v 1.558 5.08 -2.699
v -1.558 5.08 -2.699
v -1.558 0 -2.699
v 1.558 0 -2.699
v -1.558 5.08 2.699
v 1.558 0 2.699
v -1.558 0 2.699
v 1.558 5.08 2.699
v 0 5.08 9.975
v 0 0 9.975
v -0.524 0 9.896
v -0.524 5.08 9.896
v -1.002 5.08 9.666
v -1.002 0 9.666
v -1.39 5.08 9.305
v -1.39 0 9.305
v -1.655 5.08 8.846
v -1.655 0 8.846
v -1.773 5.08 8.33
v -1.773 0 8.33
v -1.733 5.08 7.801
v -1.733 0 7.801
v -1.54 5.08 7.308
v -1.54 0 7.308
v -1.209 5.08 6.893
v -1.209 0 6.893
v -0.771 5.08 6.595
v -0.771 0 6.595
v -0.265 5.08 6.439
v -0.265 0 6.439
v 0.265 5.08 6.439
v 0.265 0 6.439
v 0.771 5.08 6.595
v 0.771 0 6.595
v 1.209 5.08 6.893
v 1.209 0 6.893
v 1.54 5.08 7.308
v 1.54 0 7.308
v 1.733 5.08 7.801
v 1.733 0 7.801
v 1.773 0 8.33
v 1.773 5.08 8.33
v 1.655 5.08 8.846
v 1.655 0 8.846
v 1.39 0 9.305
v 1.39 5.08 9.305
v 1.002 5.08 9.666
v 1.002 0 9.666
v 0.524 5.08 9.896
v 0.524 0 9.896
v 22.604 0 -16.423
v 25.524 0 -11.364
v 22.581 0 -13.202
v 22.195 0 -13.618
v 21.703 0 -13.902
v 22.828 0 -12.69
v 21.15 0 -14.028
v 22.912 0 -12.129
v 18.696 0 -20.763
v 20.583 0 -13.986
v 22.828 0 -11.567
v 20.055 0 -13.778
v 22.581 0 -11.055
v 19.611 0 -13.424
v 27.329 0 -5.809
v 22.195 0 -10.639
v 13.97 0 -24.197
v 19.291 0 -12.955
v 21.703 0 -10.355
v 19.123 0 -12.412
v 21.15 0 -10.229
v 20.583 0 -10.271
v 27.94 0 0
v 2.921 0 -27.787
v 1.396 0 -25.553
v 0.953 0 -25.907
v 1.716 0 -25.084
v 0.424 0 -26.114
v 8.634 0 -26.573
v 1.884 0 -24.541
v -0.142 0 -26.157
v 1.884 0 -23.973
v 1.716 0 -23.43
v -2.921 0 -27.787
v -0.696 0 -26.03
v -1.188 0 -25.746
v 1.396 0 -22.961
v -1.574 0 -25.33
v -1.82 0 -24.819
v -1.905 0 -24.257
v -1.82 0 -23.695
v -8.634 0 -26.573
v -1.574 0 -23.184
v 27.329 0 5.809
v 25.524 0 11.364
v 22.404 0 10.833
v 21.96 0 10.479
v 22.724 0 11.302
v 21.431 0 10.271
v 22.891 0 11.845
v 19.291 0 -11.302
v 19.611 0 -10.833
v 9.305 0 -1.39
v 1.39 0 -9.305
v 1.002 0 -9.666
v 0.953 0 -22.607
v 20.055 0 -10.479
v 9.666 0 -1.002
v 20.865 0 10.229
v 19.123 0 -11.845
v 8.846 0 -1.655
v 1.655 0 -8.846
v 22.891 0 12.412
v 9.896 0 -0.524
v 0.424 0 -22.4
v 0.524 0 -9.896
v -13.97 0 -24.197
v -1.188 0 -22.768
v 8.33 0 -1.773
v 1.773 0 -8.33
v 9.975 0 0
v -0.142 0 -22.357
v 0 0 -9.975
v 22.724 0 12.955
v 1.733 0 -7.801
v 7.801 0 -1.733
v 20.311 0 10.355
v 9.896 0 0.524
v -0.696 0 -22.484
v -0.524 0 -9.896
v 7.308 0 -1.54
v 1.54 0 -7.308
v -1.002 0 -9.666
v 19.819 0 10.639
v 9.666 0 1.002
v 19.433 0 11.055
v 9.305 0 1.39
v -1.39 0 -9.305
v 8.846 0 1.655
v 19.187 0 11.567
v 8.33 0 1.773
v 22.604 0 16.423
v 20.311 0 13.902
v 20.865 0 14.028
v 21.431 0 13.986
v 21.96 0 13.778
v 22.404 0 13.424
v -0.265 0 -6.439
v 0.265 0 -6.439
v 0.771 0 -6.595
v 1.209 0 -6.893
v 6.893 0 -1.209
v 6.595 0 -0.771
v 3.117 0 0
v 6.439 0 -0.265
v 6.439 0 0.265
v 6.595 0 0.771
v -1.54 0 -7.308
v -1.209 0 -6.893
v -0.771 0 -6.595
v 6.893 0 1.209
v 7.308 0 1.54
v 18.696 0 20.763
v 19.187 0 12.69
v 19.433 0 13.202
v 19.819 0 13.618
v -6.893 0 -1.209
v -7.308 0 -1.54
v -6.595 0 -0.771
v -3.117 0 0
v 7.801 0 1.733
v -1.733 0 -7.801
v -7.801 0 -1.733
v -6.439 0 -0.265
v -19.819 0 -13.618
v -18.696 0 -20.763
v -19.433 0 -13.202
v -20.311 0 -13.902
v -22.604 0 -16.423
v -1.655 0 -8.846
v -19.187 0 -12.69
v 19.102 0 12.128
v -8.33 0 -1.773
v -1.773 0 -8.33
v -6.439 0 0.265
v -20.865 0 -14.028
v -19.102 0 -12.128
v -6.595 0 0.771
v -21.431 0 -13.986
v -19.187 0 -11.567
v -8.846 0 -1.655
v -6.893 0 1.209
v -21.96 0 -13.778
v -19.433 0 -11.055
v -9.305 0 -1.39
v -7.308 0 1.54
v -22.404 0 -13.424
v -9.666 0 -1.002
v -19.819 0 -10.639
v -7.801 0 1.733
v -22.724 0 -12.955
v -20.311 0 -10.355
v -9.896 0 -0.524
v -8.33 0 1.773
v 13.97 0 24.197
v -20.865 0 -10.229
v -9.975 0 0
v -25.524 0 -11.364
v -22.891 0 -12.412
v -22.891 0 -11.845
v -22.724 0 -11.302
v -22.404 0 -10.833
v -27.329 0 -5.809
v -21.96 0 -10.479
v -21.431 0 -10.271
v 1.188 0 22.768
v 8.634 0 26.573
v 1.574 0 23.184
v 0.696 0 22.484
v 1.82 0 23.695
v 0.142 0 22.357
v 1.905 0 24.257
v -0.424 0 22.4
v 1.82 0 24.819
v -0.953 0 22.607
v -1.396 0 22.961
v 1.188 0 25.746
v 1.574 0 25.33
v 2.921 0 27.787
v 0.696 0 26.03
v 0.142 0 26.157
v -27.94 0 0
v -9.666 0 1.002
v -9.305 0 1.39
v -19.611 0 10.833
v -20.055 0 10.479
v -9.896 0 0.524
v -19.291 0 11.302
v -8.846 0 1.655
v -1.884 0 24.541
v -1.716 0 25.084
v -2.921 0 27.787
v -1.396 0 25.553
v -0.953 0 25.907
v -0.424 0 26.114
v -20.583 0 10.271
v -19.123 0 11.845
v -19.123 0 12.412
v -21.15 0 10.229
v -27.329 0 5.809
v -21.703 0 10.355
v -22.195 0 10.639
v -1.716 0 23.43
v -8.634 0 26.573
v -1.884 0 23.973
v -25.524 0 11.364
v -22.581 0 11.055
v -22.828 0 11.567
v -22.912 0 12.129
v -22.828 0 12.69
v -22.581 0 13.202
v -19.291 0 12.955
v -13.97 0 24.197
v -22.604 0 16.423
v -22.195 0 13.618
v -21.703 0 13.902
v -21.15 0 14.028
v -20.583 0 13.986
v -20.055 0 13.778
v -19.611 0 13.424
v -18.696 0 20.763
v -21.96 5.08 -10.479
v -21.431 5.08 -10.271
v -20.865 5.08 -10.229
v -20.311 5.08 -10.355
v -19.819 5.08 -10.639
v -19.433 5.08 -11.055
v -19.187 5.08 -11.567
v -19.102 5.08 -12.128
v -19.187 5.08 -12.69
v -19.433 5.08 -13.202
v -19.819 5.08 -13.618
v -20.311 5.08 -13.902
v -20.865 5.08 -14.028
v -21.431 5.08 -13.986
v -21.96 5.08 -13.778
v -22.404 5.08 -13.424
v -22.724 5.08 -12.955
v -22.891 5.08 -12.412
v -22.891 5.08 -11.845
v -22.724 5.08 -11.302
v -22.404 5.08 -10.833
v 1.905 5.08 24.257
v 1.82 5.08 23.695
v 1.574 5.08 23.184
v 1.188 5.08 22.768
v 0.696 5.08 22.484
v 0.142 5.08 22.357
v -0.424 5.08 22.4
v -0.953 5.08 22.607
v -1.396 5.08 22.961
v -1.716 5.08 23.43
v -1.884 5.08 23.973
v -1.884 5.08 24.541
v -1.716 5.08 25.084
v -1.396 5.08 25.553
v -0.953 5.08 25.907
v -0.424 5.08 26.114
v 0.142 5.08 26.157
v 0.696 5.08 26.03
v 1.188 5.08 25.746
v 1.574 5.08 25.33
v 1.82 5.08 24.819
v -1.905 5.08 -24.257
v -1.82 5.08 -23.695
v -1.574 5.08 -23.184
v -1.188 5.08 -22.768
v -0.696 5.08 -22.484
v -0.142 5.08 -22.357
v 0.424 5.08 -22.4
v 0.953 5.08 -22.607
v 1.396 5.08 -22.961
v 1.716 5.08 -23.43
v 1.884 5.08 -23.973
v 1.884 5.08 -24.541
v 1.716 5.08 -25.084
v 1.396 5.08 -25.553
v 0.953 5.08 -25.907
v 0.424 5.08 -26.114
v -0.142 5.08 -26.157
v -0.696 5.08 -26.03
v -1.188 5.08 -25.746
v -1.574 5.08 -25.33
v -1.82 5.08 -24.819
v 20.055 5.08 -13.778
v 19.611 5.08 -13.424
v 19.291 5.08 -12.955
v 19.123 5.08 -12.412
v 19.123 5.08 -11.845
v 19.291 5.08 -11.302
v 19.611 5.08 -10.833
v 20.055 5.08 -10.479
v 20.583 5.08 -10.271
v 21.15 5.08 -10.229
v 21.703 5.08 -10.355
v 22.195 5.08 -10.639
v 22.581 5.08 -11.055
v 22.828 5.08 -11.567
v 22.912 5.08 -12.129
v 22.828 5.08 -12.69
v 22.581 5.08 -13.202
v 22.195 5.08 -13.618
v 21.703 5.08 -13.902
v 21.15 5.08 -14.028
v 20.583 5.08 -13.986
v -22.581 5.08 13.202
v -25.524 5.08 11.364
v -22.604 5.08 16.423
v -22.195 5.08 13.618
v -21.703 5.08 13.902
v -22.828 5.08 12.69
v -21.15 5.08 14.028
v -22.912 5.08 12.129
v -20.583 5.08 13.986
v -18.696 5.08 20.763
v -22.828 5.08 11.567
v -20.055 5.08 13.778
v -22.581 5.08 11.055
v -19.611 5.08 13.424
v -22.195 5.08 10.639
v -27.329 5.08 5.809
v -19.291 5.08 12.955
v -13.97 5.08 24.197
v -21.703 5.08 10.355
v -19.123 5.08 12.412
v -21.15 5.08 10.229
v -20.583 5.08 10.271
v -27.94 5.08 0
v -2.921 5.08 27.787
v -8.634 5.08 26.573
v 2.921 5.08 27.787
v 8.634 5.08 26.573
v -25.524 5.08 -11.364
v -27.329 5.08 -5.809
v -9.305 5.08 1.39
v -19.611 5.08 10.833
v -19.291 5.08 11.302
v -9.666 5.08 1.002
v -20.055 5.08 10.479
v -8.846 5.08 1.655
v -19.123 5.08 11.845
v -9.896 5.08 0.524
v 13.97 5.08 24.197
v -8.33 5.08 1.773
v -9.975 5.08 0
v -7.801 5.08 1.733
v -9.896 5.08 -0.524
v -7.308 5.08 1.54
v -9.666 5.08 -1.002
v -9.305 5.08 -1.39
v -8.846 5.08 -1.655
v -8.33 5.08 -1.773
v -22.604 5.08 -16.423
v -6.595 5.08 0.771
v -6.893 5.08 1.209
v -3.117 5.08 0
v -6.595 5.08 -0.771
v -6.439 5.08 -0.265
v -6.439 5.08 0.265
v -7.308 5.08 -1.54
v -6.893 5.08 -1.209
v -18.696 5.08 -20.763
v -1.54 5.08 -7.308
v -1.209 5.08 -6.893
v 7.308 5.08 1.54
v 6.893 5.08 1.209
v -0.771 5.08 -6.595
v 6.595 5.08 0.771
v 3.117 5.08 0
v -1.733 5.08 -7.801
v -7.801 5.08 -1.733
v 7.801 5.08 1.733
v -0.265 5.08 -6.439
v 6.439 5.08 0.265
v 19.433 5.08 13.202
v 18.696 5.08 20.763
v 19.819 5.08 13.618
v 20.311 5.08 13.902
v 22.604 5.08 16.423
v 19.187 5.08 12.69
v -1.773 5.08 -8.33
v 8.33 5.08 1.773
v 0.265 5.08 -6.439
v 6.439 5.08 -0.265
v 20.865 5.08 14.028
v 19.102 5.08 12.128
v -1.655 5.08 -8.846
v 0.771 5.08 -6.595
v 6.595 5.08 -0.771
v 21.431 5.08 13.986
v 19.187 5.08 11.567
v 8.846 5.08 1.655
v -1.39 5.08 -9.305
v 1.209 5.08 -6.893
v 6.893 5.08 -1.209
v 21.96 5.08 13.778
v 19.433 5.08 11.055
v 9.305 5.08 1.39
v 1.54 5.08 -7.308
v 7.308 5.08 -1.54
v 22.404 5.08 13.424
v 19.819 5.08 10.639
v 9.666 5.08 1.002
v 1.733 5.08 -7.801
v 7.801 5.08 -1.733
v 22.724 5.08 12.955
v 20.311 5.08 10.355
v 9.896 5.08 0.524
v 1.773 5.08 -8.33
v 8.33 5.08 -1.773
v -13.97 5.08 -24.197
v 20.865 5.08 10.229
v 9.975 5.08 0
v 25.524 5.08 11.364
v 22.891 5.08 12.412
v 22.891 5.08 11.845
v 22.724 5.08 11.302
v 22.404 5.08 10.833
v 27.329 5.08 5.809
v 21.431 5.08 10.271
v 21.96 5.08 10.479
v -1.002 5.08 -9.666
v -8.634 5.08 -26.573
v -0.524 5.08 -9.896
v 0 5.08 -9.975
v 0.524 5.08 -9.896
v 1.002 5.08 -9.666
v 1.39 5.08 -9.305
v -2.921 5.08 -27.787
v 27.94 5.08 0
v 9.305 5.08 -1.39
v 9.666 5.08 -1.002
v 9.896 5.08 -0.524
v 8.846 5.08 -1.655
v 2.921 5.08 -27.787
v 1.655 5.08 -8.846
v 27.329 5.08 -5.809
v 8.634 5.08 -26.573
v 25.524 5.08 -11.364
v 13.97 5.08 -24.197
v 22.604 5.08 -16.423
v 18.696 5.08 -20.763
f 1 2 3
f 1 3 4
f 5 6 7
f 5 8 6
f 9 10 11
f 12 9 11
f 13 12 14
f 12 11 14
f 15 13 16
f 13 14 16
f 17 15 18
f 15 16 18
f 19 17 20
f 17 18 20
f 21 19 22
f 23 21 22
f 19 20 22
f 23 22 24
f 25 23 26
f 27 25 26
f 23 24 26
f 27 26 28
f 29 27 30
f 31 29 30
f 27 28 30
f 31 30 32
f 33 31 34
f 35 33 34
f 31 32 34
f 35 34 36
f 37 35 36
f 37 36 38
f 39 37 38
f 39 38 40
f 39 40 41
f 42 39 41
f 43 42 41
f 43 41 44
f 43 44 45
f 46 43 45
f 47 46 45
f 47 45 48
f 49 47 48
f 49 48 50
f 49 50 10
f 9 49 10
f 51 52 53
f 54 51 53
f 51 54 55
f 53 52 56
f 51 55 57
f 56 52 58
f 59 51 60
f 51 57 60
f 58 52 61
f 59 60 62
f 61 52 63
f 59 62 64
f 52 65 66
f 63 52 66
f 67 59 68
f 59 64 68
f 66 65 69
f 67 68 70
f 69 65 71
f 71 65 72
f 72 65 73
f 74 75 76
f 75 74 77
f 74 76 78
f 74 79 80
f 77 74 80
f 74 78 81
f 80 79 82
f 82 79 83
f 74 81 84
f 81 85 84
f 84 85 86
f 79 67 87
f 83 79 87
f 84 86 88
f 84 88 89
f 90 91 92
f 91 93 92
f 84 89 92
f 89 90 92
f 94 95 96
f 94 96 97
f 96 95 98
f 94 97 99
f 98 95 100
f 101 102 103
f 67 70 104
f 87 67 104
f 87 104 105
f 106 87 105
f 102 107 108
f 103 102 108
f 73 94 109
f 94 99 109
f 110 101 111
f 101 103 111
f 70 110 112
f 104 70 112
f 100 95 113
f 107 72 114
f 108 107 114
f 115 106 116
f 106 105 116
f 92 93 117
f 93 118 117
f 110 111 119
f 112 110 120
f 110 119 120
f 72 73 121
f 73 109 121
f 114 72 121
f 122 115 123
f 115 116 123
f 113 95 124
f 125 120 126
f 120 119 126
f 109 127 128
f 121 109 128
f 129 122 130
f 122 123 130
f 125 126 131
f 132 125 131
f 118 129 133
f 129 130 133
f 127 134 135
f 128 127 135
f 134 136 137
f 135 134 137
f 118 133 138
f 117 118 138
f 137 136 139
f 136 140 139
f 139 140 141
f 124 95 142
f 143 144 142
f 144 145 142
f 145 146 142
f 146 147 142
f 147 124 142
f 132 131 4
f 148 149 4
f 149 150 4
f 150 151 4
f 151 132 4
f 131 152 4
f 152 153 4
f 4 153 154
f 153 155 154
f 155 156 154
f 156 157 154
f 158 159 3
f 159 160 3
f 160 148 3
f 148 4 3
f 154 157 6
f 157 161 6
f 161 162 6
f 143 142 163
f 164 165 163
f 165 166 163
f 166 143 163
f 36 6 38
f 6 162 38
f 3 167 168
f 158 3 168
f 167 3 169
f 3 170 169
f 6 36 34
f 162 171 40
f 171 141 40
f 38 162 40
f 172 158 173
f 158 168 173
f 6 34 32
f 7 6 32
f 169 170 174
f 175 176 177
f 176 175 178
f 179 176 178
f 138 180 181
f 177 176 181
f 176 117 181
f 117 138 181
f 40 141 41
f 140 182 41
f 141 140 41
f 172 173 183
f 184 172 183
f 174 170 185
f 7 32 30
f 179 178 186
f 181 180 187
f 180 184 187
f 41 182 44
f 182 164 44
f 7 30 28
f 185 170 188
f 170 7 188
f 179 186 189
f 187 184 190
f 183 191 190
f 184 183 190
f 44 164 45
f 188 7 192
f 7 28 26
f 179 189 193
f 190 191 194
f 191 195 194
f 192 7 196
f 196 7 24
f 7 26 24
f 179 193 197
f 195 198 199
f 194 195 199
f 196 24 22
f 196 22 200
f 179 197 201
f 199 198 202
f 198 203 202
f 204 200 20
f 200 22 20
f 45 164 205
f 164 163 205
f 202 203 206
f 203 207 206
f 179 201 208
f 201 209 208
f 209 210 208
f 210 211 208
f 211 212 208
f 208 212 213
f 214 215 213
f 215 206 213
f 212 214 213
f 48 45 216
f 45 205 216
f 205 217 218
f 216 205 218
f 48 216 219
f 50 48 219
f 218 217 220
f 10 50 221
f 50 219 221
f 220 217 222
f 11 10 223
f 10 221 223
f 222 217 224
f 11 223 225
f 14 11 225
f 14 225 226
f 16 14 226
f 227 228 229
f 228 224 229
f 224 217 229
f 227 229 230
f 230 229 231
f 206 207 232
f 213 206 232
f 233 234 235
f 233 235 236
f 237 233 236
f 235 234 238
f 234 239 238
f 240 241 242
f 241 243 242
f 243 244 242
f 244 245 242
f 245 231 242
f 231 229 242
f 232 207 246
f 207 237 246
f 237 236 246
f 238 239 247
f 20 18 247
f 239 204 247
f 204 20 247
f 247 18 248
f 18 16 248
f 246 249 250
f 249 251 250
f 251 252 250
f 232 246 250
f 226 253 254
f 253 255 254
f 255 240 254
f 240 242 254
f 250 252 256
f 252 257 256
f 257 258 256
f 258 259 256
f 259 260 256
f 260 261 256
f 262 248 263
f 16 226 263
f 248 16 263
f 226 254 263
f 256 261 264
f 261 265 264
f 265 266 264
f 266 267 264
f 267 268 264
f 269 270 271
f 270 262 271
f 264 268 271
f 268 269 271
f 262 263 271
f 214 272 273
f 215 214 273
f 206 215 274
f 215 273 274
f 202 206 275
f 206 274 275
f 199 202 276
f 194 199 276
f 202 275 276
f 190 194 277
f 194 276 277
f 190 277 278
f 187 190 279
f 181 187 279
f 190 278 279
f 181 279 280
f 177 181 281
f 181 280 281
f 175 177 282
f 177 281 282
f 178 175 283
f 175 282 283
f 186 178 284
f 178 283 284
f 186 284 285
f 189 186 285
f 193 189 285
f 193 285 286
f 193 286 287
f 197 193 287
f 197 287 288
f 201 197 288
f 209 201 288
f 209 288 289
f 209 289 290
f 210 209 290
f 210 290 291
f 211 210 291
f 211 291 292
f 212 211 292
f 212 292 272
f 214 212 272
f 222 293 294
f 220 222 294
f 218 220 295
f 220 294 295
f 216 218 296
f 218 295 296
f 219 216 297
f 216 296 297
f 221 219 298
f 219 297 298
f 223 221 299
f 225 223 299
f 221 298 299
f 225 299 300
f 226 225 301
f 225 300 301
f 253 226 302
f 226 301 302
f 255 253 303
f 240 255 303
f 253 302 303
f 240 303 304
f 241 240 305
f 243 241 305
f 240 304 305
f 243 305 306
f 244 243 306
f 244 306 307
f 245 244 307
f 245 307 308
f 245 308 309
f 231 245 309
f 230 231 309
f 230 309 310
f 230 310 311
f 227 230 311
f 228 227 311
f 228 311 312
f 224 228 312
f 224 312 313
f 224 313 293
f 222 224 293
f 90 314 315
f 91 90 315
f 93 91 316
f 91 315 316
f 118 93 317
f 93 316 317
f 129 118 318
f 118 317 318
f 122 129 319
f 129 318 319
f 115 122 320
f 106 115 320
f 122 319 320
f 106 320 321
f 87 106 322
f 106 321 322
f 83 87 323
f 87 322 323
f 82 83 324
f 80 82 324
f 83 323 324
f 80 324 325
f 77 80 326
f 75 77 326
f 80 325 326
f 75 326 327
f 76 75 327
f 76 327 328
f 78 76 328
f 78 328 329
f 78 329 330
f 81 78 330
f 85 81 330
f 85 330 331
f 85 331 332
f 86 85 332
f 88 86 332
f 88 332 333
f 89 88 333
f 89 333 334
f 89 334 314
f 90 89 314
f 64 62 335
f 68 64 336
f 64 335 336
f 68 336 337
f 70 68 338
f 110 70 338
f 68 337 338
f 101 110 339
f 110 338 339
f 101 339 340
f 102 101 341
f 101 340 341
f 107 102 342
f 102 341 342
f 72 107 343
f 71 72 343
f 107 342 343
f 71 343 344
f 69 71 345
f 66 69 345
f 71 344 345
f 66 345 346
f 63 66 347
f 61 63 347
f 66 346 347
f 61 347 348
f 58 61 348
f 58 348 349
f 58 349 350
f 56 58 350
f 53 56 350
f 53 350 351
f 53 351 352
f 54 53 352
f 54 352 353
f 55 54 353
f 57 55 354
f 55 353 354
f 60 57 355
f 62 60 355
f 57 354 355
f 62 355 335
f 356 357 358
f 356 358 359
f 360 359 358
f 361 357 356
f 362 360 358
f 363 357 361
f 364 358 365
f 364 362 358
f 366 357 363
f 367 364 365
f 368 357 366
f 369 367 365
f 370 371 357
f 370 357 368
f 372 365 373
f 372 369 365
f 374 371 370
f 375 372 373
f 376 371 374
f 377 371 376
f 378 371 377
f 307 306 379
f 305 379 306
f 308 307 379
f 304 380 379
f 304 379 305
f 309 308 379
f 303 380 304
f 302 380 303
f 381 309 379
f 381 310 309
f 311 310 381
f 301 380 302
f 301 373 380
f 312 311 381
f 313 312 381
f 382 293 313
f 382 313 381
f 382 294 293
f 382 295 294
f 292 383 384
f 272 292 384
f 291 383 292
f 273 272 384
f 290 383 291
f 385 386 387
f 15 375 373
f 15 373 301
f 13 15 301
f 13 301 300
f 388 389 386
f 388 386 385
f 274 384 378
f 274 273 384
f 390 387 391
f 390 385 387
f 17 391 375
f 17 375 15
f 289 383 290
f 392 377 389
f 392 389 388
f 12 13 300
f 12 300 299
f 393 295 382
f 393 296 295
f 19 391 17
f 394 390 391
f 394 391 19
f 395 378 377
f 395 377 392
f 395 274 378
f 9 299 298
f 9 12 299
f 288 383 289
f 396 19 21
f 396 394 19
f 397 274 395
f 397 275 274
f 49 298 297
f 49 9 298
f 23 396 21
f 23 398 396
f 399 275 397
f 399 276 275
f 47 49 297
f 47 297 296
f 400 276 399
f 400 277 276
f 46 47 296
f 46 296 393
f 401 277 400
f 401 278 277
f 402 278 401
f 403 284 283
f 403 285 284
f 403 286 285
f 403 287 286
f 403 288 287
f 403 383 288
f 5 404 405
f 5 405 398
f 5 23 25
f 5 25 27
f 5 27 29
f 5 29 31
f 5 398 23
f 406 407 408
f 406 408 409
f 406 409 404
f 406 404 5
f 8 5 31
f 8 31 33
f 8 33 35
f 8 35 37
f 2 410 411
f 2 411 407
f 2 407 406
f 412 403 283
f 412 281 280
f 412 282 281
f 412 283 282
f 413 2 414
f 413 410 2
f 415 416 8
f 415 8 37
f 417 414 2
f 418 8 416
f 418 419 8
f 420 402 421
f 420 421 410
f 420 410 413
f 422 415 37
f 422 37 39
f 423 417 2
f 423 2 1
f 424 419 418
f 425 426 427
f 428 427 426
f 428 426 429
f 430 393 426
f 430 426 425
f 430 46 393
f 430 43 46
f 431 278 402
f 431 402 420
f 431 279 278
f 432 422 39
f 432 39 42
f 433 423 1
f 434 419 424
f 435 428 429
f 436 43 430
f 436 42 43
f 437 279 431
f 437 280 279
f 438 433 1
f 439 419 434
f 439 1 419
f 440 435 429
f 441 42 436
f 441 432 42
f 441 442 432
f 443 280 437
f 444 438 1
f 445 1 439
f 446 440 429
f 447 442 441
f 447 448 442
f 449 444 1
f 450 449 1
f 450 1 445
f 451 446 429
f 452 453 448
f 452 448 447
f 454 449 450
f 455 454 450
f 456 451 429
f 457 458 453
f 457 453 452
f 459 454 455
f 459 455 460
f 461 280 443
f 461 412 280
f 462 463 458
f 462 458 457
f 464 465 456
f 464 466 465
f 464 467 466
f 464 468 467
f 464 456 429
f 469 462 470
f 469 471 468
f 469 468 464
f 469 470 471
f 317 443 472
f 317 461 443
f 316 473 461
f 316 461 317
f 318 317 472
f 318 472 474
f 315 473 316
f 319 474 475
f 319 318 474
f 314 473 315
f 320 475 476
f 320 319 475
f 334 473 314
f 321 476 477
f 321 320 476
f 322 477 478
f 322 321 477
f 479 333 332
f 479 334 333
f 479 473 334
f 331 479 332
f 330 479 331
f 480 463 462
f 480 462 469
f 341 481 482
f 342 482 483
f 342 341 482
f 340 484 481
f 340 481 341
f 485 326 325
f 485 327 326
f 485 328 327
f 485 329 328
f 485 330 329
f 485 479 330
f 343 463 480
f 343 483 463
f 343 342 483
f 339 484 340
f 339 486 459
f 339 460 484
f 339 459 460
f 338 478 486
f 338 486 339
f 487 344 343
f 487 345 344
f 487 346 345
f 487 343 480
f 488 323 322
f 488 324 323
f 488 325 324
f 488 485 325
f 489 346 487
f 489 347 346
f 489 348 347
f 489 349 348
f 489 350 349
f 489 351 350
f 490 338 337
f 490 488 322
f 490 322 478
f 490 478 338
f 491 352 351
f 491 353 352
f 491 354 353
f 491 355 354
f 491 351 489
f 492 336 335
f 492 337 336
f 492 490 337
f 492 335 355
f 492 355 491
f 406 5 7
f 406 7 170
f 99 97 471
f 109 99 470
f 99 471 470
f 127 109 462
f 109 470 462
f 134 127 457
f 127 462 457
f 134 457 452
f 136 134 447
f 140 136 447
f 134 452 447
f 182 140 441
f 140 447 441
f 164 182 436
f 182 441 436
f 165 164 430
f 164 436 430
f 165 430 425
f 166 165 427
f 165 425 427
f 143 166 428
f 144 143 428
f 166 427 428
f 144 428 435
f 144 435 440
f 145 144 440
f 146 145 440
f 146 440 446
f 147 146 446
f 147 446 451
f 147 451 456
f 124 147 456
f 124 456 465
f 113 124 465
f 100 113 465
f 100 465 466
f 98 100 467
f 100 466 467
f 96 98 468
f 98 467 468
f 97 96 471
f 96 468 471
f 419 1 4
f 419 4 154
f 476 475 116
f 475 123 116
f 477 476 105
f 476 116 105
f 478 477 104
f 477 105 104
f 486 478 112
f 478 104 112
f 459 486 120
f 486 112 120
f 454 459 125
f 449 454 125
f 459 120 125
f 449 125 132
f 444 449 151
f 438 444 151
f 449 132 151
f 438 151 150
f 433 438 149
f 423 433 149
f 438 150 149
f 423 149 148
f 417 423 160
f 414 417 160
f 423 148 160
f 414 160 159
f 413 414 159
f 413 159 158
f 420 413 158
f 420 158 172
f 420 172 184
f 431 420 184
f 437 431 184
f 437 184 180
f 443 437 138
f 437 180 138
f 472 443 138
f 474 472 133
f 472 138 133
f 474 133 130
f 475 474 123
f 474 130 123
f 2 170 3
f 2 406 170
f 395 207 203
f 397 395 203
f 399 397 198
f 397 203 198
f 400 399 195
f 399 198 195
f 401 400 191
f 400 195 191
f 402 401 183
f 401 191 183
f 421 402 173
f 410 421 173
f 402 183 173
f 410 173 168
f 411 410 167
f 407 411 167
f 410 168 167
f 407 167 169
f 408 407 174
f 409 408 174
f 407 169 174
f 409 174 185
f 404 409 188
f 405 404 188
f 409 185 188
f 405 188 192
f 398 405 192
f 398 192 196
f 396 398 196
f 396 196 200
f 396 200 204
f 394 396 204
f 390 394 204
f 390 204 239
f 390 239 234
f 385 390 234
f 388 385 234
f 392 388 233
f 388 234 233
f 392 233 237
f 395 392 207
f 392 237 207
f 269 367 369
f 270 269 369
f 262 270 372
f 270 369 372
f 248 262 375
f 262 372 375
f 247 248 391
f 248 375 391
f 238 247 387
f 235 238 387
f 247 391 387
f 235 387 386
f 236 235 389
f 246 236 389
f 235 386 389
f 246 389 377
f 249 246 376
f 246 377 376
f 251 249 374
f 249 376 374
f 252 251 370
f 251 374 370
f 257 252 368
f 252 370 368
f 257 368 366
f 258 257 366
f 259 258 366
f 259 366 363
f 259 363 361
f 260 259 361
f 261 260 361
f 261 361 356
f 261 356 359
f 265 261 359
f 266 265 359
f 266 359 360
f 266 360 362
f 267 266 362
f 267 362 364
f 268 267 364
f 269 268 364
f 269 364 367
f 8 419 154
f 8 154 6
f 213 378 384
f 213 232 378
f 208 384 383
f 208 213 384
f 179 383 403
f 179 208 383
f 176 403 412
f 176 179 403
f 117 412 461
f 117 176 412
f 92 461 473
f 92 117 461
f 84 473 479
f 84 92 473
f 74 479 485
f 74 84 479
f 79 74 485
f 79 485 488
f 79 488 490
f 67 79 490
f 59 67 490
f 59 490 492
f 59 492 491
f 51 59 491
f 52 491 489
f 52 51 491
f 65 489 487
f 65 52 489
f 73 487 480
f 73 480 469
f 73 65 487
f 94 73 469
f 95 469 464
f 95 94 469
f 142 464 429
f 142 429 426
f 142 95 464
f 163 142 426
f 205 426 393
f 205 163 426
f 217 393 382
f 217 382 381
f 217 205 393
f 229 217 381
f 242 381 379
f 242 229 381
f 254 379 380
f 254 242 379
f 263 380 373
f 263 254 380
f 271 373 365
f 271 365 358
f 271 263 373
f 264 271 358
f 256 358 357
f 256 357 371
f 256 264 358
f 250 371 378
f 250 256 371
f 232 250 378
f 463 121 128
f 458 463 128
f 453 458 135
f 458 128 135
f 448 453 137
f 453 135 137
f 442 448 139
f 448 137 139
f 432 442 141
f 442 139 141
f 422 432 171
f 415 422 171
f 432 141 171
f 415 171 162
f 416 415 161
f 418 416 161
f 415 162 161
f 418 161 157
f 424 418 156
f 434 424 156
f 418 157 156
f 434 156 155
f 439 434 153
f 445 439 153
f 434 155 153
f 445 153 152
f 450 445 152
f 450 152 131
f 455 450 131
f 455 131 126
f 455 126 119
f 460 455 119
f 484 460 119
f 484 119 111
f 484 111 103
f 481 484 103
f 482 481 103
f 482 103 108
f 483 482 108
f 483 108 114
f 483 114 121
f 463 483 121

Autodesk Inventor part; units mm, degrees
ref_plane "YZ Plane" through (0, 0, 0) normal (1, 0, 0) x (0, 1, 0)
sketch "Sketch1" plane through (0, 0, 0) normal (0, 1, 0) x (-1, 0, 0)
  circle A0 centre (0, 0) radius 27.94
  dimension "d0" = 55.88
extrude "Extrusion1" add sketch "Sketch1" along normal blind 7.62
ref_plane "Work Plane5" through (0, 21.082, 0) normal (0, 1, 0) x (1, 0, 0)
sketch "Sketch5" plane through (0, 21.082, 0) normal (0, 1, 0) x (1, 0, 0)
  line L0 (0, 0) -> (0, 2.667)
  line L1 (-3.1168, 0) -> (-1.5584, 2.6992)
  line L2 (-1.5584, 2.6992) -> (1.5584, 2.6992)
  line L3 (1.5584, 2.6992) -> (3.1168, 0)
  line L4 (3.1168, 0) -> (1.5584, -2.6992)
  line L5 (1.5584, -2.6992) -> (-1.5584, -2.6992)
  line L6 (-1.5584, -2.6992) -> (-3.1168, 0)
  dimension "d10" = 2.667
extrude "Extrusion4" cut sketch "Sketch5" against normal blind 25.4
sketch "Sketch6" plane through (0, 7.62, 0) normal (0, 1, 0) x (1, 0, 0)
  circle A0 centre (0, 0) radius 27.94 projected
  line L0 (0, -27.94) -> (0, -26.162)
  line L1 (0, -26.162) -> (0, -24.257)
  circle A1 centre (0, -24.257) radius 1.905
  dimension "d13" = 1.778
  dimension "d14" = 1.905
extrude "Extrusion5" cut sketch "Sketch6" against normal blind 25.4 contours A1
ref_plane "Work Plane6" through (0, 21.082, 0) normal (0, 1, 0) x (1, 0, 0)
pattern_circular "Circular Pattern1" count 6 over 360 about axis through (0, 21.082, 0) along (0, 1, 0) of "Extrusion5"
sketch "Sketch8" plane through (0, 0, 0) normal (0, -1, 0) x (1, 0, 0)
  line L0 (3.1168, 0) -> (1.5584, -2.6992) projected
  line L1 (3.1168, 0) -> (6.4188, 0)
  line L2 (6.4188, 0) -> (8.1968, 0)
  circle A0 centre (8.1968, 0) radius 1.778
  point P0 (0, 0)
  dimension "d20" = 3.302
  dimension "d21" = 1.778
extrude "Extrusion6" cut sketch "Sketch8" against normal blind 25.4
pattern_circular "Circular Pattern2" count 4 over 360 about axis through (0, 21.082, 0) along (0, 1, 0) of "Extrusion6"
sketch "Sketch10" plane through (0, 7.62, 0) normal (0, 1, 0) x (1, 0, 0)
  circle A0 centre (0, 0) radius 27.94
extrude "Extrusion8" cut sketch "Sketch10" against normal blind 2.54
properties part number "Wheel Mount"
